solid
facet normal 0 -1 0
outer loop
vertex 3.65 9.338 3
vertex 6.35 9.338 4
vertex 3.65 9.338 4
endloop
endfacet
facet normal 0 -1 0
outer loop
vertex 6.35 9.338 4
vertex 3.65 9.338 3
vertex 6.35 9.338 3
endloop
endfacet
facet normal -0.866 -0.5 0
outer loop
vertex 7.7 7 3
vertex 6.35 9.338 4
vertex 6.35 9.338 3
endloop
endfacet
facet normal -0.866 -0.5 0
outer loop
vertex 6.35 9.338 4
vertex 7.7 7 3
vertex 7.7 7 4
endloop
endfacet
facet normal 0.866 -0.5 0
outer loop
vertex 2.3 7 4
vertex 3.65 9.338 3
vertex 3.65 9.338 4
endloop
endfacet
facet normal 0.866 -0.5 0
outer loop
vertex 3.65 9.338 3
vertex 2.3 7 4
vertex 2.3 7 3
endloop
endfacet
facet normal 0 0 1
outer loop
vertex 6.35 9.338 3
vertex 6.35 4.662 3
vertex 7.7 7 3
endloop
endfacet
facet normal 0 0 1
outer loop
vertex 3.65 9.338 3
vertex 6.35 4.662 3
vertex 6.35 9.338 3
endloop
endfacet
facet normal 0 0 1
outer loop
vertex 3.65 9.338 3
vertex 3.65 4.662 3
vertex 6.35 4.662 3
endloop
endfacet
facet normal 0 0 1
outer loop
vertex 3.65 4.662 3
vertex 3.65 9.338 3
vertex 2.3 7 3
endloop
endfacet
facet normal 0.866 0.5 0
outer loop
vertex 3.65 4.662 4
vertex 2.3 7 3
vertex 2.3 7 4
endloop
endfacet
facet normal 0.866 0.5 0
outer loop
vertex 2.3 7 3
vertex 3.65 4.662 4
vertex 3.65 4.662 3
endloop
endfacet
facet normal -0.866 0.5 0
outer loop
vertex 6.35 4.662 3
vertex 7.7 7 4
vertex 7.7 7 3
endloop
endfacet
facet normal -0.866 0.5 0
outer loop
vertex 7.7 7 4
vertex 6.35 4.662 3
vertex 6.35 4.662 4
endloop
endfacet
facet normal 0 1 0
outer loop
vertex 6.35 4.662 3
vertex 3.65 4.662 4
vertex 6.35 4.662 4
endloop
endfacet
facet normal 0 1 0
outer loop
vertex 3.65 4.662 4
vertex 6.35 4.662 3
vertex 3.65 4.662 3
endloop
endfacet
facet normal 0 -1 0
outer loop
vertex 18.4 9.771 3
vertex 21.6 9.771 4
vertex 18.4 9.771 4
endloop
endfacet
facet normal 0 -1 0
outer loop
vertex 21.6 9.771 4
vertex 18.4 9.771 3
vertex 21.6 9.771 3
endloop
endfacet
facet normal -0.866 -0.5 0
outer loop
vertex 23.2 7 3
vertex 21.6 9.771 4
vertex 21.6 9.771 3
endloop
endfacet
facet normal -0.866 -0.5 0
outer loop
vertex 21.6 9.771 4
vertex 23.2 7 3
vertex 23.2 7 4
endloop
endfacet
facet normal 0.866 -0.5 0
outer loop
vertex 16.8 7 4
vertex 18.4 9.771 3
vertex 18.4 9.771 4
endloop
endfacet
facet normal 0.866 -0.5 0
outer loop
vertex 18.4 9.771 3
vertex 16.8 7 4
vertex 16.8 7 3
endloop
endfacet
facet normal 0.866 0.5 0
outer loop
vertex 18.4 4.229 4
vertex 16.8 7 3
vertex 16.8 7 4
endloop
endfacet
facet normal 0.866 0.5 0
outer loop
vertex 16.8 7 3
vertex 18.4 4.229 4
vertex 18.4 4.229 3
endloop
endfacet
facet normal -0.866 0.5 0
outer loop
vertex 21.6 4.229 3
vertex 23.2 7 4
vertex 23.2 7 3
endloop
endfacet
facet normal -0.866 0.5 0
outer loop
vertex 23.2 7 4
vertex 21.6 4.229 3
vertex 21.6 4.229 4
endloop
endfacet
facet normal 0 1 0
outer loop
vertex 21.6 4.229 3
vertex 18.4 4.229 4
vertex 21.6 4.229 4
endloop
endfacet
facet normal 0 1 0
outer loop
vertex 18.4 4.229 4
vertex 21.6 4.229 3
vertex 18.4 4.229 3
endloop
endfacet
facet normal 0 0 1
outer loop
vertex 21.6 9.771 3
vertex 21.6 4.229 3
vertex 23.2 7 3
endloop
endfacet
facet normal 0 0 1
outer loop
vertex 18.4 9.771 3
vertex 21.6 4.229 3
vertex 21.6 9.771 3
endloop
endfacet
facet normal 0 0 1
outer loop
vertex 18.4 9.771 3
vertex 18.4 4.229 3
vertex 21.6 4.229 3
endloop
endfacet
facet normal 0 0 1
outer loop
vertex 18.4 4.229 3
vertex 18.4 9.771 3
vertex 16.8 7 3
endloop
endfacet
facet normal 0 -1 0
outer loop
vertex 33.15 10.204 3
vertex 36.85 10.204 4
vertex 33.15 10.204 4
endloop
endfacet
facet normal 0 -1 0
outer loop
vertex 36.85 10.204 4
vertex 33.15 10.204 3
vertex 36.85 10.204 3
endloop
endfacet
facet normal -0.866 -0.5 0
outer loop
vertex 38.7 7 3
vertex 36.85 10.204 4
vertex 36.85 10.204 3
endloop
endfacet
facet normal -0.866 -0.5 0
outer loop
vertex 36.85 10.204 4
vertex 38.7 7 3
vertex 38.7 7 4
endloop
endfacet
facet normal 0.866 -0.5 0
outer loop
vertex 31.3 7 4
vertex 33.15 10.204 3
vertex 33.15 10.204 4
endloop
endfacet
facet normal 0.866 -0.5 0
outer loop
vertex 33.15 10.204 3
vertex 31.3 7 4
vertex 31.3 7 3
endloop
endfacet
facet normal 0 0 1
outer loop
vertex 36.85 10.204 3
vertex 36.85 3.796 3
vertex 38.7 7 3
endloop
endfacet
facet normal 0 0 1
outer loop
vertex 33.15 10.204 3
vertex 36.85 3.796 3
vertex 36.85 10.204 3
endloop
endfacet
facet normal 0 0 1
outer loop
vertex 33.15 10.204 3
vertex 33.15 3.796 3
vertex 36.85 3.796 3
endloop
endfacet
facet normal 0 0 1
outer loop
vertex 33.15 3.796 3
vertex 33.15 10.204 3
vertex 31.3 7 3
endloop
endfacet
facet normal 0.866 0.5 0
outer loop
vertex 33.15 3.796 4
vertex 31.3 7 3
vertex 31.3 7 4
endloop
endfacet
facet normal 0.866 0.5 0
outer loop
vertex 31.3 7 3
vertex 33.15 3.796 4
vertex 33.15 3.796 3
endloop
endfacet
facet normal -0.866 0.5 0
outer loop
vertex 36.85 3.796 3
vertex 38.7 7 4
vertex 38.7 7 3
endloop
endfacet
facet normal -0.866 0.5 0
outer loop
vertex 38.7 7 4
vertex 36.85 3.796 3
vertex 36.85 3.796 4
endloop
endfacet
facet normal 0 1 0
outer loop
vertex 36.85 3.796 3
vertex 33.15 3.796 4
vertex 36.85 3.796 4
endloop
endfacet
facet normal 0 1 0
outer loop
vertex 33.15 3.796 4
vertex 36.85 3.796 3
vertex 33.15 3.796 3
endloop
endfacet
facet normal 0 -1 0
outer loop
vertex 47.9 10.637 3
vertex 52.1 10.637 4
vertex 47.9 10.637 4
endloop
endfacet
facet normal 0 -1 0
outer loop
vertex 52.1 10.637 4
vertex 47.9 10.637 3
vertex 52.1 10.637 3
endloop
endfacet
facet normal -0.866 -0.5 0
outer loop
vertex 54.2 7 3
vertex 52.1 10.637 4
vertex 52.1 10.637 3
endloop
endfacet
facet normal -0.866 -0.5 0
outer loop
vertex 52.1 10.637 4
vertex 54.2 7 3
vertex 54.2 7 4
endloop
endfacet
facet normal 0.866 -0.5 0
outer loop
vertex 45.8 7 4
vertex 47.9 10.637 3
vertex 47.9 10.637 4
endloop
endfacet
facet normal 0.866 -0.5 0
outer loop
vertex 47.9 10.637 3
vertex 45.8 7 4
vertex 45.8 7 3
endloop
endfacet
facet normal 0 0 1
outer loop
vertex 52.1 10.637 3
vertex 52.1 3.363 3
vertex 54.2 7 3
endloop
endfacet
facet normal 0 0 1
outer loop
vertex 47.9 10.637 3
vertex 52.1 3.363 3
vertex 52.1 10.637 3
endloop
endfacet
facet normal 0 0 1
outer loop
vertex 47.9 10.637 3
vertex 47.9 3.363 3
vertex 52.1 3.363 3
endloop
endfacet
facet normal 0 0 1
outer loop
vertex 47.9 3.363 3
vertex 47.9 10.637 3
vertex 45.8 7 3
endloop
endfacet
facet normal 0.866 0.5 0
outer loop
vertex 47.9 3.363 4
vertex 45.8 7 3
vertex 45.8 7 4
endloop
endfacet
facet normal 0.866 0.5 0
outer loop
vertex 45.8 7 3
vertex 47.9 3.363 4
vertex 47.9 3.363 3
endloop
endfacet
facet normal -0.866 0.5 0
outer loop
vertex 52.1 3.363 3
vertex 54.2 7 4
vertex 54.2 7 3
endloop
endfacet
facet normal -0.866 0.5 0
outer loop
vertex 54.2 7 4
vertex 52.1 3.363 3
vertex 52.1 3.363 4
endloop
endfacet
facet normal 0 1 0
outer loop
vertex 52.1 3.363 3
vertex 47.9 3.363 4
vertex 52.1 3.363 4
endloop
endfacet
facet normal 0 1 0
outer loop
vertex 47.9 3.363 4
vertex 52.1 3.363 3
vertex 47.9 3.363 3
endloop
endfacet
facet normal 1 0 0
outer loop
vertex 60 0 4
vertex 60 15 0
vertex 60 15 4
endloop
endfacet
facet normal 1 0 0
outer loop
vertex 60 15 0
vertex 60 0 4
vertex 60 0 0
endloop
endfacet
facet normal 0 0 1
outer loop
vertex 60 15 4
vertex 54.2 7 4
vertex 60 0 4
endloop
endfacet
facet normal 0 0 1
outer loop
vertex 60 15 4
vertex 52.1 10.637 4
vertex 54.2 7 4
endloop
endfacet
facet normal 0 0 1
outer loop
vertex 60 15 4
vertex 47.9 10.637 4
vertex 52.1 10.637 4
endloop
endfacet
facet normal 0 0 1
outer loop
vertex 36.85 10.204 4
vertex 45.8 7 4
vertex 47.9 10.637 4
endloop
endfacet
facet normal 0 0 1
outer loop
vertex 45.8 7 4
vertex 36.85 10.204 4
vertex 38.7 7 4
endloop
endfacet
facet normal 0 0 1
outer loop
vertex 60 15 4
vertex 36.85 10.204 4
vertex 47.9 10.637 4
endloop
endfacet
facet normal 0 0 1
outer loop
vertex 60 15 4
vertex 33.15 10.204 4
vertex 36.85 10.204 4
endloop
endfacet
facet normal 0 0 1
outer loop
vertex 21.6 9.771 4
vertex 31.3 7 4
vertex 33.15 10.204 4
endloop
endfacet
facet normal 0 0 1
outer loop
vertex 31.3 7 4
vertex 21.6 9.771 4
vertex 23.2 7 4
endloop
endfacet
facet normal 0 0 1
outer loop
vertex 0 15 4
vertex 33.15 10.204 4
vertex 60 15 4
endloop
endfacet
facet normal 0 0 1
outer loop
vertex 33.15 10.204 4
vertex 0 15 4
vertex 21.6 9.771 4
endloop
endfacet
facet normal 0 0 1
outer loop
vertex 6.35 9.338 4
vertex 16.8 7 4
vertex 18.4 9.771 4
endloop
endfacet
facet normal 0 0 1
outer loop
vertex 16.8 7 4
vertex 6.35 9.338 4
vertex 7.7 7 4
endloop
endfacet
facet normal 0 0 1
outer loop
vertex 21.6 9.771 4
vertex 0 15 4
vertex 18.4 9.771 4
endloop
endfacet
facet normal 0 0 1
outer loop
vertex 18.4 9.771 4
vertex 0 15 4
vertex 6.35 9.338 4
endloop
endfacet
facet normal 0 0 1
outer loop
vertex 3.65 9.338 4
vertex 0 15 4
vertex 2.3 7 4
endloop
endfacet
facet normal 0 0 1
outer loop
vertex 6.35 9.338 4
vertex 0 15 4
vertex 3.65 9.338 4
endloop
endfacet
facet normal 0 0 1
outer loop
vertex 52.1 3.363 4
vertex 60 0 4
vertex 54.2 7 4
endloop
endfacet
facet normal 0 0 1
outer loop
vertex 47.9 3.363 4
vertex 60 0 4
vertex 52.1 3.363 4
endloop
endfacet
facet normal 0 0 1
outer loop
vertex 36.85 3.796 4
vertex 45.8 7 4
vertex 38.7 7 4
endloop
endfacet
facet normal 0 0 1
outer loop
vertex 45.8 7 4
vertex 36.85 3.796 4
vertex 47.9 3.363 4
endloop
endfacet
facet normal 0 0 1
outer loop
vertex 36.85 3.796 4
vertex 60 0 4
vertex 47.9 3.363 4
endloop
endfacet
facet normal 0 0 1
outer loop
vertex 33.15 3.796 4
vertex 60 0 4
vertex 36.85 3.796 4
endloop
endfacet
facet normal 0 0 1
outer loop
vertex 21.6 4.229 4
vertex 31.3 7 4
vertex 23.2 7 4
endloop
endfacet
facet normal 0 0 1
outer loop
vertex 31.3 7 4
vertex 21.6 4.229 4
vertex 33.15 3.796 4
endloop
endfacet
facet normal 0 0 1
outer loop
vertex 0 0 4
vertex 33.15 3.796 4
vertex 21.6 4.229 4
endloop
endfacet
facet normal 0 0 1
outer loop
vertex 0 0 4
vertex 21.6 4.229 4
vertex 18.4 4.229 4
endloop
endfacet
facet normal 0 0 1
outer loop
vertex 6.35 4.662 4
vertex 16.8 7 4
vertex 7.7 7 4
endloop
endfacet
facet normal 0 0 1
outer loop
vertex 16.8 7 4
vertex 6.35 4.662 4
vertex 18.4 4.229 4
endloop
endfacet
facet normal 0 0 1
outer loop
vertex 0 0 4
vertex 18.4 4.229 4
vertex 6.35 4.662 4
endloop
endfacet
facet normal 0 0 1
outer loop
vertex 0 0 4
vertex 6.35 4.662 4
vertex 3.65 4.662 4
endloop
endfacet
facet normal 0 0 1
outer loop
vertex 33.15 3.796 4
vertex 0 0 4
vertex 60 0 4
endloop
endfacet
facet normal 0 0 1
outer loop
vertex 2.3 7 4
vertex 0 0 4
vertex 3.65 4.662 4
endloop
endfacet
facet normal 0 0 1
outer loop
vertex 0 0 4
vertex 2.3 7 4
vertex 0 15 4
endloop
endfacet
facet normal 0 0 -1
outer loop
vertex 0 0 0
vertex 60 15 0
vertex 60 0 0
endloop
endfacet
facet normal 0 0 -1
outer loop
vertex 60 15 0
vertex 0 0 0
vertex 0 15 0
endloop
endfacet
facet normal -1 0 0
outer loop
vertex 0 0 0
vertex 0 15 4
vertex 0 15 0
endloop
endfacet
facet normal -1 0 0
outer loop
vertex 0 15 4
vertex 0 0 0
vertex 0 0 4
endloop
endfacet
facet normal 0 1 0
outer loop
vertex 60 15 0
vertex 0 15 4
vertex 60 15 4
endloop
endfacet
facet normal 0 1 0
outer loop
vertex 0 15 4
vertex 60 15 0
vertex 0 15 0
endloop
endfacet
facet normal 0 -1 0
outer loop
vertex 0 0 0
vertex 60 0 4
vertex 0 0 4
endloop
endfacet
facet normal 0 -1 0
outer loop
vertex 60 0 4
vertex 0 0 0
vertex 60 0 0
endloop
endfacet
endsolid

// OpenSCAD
difference()
{
    cube([60, 15, 4]);

    for (i=[0:3]) 
    {
        translate([5 + i * 15, 7, 4])
                cylinder(2, d=i + 5.4, center = true, $fn=6);
    }

}
